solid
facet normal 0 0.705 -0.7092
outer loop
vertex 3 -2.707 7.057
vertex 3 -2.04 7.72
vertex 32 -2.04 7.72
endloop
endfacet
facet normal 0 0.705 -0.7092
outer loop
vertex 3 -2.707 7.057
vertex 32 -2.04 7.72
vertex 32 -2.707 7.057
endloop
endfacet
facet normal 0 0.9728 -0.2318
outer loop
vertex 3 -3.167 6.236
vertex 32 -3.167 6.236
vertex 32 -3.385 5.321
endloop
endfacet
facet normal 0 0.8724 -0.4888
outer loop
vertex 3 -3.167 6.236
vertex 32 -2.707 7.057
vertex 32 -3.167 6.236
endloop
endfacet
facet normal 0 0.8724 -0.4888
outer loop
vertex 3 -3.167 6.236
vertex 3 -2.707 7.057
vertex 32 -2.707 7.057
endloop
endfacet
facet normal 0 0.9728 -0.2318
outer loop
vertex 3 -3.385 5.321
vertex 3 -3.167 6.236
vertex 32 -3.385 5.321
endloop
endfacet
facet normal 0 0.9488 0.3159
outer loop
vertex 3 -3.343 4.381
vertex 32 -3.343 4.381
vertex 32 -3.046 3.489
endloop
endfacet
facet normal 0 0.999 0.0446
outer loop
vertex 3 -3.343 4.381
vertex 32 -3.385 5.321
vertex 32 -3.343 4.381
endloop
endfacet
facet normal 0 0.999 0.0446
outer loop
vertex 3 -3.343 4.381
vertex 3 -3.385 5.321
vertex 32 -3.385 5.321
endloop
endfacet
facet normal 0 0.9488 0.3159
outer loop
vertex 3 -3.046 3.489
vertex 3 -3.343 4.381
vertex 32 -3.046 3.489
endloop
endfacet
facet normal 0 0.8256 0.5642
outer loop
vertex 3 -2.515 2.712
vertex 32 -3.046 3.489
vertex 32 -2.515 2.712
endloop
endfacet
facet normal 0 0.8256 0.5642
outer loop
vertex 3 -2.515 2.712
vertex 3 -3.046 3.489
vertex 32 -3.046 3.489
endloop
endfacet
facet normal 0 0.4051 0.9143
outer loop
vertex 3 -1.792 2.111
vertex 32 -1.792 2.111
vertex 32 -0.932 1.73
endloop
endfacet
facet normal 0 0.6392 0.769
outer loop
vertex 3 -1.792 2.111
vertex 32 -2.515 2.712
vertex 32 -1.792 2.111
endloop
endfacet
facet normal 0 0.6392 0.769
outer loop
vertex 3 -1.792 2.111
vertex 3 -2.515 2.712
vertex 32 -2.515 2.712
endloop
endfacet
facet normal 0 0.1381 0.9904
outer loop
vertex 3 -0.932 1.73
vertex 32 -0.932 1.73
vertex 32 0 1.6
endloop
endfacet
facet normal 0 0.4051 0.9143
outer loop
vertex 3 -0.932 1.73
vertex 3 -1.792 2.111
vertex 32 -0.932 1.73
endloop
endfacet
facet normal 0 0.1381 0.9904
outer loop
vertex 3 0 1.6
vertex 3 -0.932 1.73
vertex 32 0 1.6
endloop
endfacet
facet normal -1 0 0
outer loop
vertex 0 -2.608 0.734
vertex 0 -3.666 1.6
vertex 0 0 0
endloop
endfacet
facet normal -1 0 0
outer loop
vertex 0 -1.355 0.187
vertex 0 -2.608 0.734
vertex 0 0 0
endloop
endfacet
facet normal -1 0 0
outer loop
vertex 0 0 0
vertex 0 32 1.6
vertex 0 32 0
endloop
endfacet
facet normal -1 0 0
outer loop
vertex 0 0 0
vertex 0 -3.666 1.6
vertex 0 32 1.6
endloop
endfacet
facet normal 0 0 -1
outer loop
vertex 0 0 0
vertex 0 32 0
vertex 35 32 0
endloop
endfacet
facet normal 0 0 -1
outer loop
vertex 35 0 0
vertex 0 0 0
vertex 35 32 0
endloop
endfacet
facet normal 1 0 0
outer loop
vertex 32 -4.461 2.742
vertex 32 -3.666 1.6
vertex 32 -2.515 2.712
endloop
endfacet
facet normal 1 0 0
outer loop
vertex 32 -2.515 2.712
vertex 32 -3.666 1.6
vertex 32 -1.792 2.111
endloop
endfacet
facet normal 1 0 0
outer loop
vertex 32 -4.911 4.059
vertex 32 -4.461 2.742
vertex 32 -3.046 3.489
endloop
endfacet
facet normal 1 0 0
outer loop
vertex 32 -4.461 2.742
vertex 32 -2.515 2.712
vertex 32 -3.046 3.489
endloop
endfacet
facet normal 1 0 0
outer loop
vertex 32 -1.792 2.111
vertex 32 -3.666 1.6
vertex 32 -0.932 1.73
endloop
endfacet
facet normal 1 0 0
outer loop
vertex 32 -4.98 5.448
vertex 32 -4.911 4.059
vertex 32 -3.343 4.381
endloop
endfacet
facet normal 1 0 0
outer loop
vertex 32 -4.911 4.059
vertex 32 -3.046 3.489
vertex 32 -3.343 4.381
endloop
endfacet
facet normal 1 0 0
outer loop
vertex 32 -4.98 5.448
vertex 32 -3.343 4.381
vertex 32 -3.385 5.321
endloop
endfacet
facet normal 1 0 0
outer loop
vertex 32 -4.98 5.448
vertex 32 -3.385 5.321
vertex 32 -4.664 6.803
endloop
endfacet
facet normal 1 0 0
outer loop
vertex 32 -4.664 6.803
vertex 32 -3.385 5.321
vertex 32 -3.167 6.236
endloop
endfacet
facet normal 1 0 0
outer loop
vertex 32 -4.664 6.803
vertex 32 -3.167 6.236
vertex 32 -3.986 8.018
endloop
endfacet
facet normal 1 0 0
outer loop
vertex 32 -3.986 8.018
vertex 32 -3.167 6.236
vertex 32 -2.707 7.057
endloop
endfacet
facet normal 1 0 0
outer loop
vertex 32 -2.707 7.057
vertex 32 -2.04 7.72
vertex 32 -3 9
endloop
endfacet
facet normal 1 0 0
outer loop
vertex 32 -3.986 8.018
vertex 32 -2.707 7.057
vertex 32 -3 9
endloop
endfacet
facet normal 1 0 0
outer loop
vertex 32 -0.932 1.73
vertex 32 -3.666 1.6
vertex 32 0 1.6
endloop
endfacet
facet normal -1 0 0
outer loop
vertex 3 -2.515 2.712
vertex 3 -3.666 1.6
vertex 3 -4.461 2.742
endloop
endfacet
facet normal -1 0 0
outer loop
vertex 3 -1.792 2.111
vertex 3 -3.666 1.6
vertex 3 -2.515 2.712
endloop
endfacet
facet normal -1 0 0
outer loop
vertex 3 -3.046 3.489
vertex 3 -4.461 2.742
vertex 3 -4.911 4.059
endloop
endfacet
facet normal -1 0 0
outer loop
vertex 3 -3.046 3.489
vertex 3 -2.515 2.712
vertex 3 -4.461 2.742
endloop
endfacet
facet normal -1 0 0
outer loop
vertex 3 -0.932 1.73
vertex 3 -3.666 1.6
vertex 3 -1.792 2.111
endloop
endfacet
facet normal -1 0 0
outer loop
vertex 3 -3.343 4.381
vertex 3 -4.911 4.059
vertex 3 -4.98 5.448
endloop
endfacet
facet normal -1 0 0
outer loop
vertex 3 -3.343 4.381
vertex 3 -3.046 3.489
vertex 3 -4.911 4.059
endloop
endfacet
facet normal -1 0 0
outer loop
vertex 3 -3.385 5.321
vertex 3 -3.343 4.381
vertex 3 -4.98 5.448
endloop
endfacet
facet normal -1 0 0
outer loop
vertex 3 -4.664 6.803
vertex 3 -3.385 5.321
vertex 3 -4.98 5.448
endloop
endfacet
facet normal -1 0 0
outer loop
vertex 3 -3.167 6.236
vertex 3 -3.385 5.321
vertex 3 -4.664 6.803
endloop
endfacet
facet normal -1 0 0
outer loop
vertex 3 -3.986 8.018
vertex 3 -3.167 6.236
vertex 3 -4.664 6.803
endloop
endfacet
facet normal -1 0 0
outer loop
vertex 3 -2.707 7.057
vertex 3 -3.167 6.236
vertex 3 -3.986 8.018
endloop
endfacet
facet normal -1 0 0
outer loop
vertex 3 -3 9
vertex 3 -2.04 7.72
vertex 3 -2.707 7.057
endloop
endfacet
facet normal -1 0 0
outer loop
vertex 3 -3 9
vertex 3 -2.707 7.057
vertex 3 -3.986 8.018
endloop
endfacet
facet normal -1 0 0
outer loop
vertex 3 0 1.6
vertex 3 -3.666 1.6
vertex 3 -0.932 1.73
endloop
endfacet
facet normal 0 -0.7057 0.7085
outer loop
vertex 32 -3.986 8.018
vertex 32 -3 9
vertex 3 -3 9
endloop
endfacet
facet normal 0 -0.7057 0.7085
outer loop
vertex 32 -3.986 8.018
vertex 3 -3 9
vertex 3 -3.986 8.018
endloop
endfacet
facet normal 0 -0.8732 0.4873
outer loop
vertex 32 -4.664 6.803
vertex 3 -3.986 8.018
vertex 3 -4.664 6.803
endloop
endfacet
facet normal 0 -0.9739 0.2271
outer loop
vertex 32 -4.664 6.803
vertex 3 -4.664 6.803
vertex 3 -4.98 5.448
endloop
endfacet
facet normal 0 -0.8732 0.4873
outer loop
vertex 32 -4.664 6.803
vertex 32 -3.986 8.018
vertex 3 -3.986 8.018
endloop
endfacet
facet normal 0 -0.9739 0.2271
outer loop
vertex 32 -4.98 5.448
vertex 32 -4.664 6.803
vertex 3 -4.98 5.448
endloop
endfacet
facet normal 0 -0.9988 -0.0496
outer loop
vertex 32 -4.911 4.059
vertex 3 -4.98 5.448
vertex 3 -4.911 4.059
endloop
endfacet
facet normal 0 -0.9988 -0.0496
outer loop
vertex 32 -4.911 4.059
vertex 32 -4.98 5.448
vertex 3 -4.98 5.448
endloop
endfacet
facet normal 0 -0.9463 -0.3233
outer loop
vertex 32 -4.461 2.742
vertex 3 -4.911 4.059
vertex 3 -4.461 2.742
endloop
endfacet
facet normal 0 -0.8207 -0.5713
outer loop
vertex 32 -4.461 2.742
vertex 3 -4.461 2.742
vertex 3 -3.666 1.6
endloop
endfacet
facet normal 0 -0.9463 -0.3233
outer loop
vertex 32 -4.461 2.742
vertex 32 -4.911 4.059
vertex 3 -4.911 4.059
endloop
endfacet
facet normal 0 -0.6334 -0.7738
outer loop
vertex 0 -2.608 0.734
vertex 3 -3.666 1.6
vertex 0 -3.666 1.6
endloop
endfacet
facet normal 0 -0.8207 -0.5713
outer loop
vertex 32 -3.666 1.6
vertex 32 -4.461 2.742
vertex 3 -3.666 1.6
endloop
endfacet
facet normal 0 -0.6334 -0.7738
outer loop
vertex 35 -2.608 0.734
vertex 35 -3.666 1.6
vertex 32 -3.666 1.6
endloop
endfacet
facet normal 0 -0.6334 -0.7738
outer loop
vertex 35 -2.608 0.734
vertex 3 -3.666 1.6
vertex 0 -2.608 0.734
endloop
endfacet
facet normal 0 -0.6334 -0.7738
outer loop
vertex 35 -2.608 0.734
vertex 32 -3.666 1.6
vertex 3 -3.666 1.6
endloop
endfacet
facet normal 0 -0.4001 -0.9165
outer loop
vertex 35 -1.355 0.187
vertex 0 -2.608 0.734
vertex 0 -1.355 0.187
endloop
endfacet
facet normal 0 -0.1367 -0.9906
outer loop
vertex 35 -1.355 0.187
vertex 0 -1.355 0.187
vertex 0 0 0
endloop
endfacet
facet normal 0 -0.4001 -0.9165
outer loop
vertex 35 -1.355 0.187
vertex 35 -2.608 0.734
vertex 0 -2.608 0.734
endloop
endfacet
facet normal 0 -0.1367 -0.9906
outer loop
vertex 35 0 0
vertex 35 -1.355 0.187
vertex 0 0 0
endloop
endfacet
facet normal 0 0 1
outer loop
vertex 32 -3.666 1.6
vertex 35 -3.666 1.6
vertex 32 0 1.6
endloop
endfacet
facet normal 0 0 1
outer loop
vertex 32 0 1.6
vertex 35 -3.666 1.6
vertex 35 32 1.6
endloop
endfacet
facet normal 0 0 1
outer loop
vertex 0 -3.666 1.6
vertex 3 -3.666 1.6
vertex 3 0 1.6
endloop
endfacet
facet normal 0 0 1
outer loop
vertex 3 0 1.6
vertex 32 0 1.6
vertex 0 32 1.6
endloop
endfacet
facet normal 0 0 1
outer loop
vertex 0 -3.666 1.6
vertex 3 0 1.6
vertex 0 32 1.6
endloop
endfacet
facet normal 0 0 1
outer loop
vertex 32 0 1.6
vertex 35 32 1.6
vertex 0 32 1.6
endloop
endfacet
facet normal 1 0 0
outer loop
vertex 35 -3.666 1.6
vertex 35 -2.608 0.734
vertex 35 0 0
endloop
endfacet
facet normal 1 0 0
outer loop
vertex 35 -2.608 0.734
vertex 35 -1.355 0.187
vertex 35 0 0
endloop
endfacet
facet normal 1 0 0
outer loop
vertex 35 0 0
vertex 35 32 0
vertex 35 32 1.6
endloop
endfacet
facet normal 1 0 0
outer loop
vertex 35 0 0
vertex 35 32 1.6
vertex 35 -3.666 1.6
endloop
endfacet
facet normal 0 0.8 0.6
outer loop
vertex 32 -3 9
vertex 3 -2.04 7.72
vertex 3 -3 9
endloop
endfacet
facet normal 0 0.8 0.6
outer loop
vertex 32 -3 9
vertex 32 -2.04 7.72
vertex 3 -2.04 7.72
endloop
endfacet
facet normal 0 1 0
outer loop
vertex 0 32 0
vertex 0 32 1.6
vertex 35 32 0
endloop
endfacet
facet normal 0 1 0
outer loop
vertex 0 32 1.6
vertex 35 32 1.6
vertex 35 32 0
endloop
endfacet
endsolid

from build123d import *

# Parameters (mm, degrees)
F1_W     = 35
F1_H     = 1.6
F4_W     = 3
F4_H     = 8
F5_DEPTH = 5.001


with BuildPart() as f2:
    # F2: sweep along a path in F0
    with BuildLine(Plane.YZ) as f2_path:
        ThreePointArc((-3, 9), (-4.743416, 3.418861), (0, 0))
    # F1 (on Front) → F2 (sweep)
    with BuildSketch(Plane.XZ):
        with Locations((17.5, 0.8)):
            Rectangle(F1_W, F1_H)
    sweep(path=f2_path.line)

    # F3: sweep along a path in F0
    with BuildLine(Plane.YZ) as f3_path:
        Line((0, 0), (32, 0))
    # F1 (on Front) → F3 (sweep)
    with BuildSketch(Plane.XZ):
        with Locations((17.5, 0.8)):
            Rectangle(F1_W, F1_H)
    sweep(path=f3_path.line)

    # F4 (on Front) → F5 (cut, through all)
    with BuildSketch(Plane.XZ):
        with Locations((1.5, 5.6)):
            Rectangle(F4_W, F4_H)
        with Locations((33.5, 5.6)):
            Rectangle(F4_W, F4_H)
    extrude(amount=F5_DEPTH, mode=Mode.SUBTRACT)


solid = f2.part
